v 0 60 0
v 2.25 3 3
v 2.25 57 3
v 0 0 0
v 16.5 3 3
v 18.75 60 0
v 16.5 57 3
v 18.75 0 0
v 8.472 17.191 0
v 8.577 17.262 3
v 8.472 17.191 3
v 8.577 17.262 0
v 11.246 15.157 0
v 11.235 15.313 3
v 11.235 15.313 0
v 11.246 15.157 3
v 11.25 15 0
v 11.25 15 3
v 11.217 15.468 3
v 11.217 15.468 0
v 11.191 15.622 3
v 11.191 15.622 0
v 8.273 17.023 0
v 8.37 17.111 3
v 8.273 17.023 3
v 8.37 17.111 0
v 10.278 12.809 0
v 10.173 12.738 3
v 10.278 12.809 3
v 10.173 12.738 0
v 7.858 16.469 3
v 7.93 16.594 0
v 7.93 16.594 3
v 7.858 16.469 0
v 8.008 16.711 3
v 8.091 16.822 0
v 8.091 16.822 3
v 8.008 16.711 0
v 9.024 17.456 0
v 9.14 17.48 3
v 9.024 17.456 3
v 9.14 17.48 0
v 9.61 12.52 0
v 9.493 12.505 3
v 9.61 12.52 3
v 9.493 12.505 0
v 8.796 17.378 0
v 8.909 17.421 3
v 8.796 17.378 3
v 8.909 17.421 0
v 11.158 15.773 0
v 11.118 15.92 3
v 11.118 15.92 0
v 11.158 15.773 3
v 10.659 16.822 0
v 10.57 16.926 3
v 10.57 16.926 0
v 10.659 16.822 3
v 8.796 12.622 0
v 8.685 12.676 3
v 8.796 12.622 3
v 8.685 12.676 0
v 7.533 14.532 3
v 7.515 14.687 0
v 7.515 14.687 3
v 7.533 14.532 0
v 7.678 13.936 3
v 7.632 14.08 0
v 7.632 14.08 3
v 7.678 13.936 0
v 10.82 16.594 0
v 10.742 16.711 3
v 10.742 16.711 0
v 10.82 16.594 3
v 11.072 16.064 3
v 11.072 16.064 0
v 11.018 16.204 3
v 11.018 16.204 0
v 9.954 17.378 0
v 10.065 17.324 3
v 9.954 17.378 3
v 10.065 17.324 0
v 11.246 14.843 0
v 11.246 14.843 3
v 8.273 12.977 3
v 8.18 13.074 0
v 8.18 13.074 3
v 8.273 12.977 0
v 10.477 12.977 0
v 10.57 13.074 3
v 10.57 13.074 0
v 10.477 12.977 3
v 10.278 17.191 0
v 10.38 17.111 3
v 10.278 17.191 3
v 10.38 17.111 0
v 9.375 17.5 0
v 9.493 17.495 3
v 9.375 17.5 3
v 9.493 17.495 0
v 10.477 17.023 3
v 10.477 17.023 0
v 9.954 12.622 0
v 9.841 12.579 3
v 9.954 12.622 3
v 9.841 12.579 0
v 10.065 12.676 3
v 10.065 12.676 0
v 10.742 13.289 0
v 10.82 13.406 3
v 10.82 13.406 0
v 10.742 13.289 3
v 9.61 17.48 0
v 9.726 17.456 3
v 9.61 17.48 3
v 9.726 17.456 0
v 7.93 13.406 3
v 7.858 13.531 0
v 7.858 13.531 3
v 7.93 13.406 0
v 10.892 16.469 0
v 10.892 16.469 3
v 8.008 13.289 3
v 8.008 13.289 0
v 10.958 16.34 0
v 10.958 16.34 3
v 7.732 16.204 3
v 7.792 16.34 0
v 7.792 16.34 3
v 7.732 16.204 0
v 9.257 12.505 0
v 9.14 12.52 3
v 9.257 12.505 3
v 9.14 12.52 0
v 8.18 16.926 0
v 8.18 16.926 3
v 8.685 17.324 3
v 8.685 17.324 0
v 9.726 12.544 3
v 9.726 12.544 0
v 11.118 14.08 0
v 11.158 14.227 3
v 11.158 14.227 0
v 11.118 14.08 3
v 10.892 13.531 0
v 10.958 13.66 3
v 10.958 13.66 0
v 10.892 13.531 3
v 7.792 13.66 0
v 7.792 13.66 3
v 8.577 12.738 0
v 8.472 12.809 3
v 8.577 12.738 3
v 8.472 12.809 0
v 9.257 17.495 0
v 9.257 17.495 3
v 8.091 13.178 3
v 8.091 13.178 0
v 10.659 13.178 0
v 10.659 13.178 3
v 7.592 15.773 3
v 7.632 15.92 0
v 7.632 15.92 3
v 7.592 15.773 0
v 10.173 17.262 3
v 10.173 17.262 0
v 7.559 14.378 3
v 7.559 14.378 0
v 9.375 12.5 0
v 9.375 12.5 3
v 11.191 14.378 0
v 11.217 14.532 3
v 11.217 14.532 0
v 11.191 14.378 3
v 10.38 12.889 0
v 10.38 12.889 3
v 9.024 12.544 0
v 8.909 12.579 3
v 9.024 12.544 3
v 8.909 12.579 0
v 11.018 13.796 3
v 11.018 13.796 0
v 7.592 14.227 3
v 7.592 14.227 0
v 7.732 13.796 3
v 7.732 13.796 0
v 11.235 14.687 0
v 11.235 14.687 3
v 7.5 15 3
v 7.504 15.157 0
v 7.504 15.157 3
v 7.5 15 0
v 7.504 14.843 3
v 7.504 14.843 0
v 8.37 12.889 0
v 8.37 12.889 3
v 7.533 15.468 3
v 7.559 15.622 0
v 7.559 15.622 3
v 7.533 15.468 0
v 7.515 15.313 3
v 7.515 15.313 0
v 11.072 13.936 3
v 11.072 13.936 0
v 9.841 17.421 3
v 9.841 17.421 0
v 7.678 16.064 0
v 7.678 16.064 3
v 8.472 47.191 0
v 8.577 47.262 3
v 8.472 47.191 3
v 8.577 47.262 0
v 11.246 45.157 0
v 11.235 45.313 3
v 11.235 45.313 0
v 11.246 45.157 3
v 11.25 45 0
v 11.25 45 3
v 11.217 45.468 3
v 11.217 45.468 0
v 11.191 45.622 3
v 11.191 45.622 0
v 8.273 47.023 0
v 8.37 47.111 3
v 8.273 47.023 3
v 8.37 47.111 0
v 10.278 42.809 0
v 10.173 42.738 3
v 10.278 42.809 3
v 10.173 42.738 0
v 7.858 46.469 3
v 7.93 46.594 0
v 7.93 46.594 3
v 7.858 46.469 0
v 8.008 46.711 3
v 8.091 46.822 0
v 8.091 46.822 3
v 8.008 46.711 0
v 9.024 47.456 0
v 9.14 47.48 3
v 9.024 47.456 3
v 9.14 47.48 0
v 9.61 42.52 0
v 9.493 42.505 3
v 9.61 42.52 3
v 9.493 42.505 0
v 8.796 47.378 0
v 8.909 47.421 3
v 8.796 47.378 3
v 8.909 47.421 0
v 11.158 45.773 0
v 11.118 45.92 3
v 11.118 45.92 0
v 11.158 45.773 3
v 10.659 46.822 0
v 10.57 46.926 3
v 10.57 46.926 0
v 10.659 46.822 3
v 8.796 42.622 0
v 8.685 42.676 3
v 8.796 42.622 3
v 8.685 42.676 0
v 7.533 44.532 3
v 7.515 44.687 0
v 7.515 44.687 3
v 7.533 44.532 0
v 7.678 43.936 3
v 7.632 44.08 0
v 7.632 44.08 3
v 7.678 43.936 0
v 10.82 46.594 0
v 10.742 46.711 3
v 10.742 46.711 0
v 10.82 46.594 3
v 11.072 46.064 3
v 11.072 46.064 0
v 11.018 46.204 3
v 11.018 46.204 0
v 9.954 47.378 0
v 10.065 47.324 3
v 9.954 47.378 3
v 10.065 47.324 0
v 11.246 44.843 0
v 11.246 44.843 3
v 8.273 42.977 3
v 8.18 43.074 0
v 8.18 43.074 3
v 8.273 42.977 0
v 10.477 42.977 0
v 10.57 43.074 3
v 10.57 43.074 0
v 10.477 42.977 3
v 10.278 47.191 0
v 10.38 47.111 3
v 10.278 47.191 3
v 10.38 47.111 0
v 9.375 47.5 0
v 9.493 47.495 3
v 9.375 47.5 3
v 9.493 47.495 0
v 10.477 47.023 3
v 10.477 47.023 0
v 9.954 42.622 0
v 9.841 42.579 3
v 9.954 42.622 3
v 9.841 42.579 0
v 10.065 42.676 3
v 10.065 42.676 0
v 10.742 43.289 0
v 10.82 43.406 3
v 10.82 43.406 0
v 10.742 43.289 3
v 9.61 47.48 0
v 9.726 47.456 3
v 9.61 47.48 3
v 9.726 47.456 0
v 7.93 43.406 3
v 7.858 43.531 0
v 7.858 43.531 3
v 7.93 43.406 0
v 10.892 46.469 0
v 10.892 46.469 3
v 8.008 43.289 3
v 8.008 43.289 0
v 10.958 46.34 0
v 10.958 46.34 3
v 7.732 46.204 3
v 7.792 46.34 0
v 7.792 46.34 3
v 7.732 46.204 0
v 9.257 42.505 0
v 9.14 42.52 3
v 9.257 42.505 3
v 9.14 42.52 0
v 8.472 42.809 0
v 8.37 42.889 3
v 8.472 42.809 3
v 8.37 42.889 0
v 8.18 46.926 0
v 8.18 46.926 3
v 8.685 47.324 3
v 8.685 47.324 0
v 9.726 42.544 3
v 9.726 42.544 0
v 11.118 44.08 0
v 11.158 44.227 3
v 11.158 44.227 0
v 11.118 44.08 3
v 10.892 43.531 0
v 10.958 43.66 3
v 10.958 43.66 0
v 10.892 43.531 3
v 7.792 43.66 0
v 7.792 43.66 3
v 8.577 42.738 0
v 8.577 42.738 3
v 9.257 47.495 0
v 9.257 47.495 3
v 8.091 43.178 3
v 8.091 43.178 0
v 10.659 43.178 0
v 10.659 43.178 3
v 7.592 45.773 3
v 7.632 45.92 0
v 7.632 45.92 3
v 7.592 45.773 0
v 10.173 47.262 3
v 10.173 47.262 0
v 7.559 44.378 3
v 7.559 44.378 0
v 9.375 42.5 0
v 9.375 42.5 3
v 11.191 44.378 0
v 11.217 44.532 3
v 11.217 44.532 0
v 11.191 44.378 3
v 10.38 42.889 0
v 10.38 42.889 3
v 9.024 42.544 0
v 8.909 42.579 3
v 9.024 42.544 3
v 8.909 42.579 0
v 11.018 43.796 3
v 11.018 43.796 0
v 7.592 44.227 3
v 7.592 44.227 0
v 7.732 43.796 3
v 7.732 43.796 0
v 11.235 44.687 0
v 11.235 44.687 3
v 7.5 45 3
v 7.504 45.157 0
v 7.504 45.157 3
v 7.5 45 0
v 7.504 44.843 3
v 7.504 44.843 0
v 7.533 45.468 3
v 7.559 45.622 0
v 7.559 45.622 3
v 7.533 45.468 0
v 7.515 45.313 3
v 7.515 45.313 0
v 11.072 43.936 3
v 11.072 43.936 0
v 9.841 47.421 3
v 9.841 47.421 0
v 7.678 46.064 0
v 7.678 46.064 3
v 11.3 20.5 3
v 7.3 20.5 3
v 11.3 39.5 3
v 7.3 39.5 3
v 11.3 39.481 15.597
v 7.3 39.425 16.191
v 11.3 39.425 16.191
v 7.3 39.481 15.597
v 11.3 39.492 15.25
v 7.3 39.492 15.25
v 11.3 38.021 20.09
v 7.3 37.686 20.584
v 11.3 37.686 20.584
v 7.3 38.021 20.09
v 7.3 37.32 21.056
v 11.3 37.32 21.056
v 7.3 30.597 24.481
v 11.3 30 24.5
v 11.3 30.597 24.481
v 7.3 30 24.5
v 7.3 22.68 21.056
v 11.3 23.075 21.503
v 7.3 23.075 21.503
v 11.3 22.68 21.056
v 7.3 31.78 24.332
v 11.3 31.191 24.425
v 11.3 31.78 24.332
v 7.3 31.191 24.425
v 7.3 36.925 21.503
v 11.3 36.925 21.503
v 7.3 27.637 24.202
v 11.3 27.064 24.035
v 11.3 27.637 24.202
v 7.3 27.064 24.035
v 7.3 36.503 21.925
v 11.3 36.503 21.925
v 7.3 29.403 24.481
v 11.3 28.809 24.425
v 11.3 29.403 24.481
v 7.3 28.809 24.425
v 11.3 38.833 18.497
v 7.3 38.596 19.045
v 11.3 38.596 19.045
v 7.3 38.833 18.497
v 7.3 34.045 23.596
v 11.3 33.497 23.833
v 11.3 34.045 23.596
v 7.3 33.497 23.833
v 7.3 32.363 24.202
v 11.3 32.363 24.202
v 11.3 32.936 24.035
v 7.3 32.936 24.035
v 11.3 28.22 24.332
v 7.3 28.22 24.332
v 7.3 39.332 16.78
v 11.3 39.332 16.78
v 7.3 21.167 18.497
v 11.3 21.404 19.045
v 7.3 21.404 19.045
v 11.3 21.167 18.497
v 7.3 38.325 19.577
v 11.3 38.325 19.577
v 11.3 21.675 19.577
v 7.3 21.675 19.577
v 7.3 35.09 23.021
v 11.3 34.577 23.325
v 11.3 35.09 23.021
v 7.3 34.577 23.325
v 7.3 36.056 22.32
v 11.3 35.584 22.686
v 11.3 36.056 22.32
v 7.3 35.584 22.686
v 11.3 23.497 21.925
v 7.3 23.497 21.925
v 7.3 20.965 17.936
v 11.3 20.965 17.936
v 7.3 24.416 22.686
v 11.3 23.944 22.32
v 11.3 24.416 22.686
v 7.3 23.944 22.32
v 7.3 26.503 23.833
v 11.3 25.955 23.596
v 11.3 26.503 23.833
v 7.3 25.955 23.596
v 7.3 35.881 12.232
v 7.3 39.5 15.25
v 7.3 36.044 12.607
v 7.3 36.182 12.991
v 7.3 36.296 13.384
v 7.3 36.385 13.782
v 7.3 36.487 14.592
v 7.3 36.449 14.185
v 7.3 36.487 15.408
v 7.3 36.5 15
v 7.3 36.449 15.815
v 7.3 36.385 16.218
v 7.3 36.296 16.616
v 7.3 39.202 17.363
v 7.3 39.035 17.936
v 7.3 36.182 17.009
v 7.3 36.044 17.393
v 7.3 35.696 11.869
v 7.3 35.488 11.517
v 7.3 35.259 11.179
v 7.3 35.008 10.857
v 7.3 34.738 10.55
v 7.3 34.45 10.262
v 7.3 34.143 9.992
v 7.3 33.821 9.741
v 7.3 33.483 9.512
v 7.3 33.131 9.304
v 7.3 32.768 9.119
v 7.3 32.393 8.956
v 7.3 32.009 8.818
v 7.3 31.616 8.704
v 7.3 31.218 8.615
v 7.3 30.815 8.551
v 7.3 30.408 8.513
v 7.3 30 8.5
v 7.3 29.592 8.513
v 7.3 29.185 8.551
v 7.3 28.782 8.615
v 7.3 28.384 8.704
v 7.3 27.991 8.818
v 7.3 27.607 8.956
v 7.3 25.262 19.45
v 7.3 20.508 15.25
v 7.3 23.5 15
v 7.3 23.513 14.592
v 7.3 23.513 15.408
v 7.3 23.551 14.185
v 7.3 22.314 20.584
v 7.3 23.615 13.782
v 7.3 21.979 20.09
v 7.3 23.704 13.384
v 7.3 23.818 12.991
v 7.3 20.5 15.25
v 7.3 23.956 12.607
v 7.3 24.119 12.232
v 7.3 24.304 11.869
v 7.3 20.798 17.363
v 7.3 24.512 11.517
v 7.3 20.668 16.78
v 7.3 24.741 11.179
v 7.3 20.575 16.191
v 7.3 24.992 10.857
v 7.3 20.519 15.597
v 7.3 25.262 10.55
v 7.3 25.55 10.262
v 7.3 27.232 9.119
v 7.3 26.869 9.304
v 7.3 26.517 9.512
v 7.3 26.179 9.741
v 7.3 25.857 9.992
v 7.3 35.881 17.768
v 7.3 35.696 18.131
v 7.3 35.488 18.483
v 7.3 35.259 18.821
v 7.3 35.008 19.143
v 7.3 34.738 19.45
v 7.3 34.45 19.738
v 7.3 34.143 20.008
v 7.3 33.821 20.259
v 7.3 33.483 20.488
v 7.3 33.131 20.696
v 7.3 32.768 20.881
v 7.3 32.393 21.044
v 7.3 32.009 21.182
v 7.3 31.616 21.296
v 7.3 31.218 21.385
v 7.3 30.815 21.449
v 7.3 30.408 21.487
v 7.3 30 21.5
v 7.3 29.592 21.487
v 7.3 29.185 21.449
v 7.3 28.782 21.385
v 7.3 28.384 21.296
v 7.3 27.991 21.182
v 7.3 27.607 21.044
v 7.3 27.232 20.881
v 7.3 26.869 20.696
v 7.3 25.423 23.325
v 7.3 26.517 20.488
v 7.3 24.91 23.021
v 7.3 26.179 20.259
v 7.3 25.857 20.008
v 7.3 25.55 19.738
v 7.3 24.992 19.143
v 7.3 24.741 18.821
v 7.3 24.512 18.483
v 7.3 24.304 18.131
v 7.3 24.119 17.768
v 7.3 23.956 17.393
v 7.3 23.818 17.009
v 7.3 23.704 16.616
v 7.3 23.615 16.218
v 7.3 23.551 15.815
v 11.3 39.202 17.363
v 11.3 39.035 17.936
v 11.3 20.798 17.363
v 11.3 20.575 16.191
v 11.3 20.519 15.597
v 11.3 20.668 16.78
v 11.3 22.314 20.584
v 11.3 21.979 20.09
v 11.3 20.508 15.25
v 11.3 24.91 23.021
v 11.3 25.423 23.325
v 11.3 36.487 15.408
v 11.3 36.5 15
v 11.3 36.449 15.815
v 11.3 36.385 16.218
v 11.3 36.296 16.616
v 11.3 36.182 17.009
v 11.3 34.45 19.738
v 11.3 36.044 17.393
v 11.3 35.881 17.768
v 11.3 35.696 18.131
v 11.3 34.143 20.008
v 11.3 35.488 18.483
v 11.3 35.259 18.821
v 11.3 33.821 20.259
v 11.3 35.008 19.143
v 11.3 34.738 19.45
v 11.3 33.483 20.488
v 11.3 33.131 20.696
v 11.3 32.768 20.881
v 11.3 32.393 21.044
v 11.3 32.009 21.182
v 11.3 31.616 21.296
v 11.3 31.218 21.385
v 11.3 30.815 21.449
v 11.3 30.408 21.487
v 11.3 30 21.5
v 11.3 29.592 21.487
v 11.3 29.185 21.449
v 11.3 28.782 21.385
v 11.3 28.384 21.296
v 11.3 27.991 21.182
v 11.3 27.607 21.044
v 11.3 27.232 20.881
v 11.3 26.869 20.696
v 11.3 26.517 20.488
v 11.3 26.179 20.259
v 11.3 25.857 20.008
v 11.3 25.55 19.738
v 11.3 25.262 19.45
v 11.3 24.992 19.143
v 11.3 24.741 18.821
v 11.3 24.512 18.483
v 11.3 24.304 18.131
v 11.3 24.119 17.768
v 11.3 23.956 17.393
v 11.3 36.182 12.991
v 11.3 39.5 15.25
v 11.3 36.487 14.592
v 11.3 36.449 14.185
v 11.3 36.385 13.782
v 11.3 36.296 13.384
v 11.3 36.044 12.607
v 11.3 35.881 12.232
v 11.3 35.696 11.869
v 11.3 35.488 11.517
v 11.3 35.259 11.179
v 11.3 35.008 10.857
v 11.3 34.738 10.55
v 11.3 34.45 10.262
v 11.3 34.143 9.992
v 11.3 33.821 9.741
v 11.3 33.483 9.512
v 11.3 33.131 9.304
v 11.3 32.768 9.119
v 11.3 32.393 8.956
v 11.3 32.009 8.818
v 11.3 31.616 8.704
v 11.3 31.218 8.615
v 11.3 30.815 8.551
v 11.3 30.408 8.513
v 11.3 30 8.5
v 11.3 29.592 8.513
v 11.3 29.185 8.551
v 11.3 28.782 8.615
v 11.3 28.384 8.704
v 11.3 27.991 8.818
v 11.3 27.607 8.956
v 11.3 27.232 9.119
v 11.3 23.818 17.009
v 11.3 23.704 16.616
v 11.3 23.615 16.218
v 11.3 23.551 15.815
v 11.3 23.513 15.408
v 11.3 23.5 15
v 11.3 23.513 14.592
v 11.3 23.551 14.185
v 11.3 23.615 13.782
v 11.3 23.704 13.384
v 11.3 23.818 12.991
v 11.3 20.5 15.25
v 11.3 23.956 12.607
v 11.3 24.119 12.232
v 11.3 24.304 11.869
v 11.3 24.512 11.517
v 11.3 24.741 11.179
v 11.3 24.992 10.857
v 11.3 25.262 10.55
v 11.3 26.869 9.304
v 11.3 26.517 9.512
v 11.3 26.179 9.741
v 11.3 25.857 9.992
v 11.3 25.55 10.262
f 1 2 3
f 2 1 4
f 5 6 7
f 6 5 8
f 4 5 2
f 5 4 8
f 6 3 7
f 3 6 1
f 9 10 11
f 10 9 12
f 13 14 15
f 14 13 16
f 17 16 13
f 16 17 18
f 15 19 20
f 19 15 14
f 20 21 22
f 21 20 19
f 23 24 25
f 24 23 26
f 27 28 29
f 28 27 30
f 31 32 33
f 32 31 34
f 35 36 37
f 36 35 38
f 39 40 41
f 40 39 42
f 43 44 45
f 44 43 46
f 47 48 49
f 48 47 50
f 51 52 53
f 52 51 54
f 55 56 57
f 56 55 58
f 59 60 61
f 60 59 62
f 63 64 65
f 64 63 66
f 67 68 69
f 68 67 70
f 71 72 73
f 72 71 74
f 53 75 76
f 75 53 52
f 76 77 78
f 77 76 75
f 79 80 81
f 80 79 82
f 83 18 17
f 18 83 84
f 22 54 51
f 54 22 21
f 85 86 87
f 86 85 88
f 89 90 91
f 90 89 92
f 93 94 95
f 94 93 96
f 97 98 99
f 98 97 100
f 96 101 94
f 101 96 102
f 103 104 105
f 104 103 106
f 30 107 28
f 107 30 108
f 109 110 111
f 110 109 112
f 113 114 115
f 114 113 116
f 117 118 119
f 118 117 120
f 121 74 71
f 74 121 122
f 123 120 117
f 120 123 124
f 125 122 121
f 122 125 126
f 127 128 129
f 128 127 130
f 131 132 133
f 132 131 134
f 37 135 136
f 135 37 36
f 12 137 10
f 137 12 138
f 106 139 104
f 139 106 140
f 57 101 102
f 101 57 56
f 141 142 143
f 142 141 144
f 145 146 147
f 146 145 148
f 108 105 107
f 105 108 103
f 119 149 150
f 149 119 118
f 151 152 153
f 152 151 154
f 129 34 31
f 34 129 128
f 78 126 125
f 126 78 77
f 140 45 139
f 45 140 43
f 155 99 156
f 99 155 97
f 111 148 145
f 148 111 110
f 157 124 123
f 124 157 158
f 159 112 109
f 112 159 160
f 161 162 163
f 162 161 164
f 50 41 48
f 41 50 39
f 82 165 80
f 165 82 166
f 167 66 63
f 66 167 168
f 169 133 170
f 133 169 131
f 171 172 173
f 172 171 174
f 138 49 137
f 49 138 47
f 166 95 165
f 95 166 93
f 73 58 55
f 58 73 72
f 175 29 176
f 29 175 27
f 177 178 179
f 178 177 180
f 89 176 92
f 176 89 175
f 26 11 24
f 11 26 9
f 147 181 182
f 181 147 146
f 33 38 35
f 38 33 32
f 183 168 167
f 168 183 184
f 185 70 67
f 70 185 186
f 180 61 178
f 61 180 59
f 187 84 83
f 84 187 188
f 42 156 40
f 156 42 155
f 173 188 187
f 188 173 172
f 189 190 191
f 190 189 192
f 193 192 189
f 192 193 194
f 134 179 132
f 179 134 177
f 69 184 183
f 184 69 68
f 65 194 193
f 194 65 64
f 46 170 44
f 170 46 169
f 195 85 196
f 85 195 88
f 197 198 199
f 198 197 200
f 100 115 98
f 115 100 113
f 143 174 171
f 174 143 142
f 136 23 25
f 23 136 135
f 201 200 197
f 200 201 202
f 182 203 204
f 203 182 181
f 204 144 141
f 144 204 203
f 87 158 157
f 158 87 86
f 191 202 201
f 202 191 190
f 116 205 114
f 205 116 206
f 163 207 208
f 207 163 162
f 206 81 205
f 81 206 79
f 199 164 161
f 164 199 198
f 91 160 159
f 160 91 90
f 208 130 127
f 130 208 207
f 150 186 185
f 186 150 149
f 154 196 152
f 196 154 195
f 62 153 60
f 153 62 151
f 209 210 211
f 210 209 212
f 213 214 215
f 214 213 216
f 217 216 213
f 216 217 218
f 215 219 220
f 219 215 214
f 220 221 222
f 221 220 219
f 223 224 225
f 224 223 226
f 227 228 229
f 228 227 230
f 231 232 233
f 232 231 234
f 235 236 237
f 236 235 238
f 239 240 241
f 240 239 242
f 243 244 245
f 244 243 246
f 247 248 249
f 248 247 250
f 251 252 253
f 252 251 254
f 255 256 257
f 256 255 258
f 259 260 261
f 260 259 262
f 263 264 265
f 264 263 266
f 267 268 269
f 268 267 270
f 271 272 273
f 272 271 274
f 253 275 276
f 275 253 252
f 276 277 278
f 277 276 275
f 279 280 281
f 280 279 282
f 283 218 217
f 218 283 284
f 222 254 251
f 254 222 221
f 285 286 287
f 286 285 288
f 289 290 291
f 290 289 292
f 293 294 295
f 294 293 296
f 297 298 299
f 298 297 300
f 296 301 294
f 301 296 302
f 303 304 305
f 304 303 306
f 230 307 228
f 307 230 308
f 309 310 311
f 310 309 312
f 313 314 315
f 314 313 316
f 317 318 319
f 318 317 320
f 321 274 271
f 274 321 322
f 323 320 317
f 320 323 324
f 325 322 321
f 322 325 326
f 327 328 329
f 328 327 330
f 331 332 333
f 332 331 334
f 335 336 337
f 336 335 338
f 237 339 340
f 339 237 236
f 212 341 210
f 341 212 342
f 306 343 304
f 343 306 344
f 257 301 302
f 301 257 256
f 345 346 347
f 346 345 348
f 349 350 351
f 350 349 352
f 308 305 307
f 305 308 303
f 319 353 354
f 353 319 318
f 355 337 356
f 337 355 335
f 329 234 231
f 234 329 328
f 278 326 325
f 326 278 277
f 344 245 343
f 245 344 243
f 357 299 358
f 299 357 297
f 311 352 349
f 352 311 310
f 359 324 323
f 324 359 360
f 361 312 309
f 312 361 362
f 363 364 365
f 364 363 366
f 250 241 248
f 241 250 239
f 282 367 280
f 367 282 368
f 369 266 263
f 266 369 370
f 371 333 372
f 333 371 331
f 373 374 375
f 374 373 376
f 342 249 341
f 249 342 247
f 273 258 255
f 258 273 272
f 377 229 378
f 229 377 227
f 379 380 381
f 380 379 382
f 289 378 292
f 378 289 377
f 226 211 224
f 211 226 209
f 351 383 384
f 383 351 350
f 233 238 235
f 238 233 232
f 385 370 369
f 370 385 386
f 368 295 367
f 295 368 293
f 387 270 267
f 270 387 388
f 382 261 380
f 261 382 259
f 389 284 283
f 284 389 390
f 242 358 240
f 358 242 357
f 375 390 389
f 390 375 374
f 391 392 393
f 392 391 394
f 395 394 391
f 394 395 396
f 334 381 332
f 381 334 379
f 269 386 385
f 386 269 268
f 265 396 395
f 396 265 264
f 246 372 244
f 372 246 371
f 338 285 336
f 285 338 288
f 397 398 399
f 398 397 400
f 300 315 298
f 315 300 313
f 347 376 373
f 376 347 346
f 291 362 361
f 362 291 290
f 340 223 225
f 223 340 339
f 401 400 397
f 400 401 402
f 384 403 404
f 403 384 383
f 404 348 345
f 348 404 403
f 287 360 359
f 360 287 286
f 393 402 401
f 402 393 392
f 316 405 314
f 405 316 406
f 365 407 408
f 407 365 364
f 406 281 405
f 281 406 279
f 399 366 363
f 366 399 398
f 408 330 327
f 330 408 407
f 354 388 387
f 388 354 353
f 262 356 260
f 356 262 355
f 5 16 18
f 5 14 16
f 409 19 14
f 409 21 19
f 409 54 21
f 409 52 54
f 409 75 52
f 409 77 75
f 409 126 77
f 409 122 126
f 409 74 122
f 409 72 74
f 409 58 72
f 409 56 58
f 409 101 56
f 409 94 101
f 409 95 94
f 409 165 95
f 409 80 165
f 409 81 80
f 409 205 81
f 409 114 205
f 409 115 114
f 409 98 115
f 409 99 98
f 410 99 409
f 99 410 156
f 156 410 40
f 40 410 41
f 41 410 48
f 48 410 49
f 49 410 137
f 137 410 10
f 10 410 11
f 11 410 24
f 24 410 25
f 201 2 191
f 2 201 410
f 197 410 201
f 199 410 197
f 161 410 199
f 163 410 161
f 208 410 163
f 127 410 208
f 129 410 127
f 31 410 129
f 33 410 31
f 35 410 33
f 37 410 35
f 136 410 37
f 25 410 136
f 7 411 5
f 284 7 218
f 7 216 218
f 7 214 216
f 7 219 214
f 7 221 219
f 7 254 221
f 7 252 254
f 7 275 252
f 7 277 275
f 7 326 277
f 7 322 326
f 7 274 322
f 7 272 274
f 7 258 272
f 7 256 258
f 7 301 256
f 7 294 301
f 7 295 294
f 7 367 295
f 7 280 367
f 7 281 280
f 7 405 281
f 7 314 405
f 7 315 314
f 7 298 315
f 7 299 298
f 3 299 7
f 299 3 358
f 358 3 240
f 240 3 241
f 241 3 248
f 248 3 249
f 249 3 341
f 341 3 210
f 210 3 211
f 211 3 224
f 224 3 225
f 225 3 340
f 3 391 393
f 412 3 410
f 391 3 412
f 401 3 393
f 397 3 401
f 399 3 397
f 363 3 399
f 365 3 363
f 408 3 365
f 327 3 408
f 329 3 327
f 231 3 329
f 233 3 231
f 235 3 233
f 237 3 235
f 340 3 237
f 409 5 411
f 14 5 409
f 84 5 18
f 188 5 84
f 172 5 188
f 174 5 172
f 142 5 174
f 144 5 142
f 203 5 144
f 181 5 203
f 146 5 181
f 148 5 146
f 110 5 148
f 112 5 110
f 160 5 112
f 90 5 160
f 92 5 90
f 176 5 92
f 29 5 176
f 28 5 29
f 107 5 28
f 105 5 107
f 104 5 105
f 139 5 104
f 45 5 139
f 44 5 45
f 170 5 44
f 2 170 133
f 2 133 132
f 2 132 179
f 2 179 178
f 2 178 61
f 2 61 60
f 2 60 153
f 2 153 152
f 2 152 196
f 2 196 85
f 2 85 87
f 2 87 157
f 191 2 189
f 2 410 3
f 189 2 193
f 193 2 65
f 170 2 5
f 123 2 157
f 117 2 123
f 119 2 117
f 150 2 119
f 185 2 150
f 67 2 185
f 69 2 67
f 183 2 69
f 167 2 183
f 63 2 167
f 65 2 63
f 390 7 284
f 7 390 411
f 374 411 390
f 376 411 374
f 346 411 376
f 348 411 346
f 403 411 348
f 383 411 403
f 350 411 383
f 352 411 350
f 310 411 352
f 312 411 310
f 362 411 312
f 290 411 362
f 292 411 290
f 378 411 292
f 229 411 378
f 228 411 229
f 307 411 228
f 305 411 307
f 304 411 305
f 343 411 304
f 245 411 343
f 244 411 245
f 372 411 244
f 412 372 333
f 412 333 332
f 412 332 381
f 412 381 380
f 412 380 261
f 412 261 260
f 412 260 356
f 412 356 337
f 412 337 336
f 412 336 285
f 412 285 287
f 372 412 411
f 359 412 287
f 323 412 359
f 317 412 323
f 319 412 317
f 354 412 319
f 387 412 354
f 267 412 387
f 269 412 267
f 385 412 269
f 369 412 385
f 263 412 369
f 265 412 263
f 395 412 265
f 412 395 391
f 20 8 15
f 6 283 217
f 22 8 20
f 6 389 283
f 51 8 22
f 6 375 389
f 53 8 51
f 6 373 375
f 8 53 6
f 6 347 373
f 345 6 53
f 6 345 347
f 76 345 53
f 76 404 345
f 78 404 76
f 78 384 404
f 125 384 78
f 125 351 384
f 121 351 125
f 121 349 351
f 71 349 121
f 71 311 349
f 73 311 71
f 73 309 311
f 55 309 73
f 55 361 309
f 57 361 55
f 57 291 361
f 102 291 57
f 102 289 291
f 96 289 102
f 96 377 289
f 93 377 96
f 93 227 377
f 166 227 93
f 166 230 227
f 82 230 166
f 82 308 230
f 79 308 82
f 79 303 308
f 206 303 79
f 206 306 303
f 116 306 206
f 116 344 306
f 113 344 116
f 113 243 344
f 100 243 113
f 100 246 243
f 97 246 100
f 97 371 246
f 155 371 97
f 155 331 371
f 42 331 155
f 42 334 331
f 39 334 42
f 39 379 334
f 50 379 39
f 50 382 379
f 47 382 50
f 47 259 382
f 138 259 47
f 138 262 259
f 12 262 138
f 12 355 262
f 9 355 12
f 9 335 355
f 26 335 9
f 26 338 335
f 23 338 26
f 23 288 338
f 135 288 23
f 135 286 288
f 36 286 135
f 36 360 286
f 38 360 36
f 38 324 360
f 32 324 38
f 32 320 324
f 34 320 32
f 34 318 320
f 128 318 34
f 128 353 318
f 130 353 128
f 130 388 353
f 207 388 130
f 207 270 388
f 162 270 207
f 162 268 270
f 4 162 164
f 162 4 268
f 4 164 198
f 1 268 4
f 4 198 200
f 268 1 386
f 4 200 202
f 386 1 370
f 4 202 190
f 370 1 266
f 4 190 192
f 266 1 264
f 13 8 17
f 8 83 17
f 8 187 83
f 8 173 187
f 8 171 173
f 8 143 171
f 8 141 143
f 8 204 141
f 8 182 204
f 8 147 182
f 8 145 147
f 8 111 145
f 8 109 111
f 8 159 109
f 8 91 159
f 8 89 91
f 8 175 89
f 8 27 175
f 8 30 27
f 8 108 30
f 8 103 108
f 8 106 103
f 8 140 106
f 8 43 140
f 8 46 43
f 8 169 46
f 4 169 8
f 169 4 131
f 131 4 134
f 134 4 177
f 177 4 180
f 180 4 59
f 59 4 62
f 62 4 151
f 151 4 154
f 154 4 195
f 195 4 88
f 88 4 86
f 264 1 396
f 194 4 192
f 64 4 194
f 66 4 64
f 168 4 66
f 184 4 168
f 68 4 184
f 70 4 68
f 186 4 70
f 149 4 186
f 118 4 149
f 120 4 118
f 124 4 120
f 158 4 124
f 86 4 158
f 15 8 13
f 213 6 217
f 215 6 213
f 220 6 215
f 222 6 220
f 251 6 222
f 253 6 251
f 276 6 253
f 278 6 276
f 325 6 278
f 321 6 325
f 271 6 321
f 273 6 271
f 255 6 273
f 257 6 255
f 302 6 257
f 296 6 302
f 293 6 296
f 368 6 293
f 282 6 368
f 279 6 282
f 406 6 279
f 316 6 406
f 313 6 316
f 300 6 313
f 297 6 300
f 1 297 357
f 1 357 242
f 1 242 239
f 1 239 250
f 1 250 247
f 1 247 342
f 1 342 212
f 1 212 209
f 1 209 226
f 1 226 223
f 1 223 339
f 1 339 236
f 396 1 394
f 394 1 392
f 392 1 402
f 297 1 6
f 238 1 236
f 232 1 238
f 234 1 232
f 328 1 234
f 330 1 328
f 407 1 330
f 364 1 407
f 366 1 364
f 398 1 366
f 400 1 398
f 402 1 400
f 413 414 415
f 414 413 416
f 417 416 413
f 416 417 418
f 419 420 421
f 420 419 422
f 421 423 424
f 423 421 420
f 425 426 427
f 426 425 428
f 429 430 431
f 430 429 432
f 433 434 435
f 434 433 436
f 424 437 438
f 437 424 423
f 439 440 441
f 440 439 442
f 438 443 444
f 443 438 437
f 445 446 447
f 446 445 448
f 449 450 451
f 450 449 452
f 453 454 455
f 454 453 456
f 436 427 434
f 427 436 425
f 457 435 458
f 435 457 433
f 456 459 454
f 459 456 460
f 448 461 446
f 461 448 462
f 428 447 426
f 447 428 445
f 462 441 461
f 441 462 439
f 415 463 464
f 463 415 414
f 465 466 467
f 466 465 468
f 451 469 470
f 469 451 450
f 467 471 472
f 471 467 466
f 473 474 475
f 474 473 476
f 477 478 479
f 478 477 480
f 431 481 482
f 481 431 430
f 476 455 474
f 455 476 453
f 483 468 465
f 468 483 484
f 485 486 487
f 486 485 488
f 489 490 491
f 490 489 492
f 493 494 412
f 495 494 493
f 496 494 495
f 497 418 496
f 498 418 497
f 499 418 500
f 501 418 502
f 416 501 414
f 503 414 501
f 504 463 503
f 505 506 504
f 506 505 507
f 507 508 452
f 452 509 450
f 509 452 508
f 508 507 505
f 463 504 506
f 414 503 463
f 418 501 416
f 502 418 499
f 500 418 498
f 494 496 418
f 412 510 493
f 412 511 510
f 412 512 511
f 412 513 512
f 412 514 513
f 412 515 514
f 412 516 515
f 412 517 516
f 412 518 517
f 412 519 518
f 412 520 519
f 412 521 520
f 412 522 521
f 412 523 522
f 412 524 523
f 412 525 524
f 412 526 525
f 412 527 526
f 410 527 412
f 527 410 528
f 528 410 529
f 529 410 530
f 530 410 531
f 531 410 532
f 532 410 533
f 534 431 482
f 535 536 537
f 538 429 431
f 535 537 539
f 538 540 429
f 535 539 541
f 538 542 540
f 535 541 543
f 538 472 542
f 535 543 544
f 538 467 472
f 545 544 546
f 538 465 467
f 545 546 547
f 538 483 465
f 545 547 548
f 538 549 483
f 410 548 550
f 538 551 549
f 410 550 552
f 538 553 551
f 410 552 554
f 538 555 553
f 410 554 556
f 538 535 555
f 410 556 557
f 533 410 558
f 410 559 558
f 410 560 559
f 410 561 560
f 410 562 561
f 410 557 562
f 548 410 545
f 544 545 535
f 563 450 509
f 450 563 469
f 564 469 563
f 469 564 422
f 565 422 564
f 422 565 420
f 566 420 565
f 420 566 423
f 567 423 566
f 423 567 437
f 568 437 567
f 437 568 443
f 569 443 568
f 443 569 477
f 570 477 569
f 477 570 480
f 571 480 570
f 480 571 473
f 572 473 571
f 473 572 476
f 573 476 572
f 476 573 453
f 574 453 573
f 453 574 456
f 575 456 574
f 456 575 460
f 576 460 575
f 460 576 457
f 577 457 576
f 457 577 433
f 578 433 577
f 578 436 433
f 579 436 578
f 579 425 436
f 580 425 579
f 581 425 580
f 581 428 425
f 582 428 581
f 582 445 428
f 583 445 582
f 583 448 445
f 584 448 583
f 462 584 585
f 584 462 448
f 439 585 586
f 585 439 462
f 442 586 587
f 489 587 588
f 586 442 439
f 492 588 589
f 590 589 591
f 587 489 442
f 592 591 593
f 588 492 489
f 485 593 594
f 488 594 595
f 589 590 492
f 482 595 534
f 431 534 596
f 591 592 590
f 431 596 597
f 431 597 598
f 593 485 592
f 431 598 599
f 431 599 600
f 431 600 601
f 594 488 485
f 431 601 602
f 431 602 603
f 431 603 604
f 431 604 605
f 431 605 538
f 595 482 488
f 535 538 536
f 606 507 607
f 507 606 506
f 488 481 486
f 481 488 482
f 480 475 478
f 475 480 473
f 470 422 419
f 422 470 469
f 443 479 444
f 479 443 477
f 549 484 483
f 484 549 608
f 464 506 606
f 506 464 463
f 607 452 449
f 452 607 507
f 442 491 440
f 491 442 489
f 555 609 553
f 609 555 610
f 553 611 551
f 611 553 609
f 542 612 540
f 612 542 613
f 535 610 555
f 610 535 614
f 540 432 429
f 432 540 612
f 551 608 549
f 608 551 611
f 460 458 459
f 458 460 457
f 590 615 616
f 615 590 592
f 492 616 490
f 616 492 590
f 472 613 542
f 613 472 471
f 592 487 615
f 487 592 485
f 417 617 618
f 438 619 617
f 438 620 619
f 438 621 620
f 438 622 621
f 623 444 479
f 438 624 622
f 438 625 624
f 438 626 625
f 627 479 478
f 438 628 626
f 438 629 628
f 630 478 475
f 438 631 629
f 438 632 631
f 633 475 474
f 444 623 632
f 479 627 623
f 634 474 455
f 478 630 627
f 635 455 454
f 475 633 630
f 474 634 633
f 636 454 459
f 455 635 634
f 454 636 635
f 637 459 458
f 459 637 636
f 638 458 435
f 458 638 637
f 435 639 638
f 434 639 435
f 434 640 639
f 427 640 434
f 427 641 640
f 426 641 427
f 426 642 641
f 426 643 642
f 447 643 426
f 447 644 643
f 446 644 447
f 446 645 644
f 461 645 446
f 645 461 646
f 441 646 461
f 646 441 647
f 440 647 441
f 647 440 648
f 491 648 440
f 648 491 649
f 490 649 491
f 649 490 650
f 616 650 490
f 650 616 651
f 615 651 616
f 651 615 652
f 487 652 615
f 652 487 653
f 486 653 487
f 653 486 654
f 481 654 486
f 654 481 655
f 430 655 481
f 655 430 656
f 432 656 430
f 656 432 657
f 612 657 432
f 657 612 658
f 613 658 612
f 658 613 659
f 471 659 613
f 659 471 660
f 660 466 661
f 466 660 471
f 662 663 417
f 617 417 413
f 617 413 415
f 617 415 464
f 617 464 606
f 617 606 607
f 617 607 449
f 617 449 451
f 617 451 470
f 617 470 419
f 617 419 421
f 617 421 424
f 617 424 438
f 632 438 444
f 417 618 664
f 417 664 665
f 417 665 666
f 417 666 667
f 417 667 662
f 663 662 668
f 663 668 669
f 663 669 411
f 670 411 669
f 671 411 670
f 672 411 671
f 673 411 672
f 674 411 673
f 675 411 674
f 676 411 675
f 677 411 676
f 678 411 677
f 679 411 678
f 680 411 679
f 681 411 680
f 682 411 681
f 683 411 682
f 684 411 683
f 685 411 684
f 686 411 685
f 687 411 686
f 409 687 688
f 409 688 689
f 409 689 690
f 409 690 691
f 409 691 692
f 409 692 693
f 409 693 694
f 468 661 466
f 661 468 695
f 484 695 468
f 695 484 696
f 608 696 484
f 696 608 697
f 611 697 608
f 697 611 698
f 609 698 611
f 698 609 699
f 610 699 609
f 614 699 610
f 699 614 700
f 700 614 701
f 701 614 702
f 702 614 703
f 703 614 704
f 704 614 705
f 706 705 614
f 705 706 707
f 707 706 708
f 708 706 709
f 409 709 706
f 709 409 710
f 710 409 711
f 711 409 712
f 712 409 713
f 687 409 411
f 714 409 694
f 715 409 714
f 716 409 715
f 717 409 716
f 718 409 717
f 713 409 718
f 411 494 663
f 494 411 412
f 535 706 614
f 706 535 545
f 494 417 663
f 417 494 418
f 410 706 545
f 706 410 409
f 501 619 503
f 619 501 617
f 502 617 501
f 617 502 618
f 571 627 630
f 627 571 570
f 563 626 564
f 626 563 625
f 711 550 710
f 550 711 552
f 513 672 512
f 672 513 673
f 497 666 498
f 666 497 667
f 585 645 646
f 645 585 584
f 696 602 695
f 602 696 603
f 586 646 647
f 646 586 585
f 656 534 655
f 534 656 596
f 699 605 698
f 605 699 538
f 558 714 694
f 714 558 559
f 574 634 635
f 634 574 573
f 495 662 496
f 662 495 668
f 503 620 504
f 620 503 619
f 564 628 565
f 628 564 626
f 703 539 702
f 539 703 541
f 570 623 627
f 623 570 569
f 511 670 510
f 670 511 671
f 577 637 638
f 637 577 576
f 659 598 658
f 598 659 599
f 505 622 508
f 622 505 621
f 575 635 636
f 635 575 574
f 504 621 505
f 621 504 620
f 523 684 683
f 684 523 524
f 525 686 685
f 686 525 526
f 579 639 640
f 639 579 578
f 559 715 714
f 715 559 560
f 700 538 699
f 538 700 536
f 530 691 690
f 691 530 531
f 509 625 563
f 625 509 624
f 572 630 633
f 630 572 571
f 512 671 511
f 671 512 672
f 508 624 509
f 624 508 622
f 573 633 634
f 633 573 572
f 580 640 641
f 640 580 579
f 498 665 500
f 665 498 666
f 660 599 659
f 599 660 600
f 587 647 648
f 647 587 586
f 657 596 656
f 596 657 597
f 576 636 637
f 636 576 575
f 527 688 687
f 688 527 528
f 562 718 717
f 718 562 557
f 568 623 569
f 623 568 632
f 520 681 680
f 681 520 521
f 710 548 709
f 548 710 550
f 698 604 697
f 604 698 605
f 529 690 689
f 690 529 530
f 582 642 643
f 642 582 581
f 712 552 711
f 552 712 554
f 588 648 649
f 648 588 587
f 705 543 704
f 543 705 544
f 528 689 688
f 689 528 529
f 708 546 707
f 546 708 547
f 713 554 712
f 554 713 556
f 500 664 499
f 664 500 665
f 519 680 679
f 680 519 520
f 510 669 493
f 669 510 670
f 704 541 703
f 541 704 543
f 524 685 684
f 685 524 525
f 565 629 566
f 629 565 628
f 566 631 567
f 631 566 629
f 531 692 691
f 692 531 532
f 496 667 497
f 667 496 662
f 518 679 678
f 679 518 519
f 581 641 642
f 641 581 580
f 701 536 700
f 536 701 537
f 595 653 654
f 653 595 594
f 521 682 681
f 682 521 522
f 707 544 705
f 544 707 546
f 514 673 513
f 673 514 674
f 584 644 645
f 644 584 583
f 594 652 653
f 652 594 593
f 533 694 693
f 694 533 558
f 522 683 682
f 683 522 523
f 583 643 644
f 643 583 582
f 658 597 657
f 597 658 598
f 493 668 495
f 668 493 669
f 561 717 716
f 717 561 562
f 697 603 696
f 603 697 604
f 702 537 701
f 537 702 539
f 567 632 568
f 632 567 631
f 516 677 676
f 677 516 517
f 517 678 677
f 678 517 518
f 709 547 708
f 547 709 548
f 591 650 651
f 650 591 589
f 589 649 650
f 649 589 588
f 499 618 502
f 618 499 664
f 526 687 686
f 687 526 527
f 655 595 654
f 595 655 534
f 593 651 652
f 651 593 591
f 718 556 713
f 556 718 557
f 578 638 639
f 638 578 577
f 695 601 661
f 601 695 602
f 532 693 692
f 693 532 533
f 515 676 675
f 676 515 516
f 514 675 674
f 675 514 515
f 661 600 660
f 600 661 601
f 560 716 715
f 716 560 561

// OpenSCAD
//Timbers Antenna holder

antennaDiam = 13;
screwDiam = 5;
height = 60;
width = 25;
thickness = 3;

module backplate(){
    difference(){
        union(){
            cube([width, height, thickness]);
        }
    
        union(){
            translate([0, 0, 0])
            rotate([0, -45, 0])
            cube([thickness * 2, height, thickness * 2]);
            translate([width, 0, 0])
            rotate([0, -45, 0])
            cube([thickness * 2, height, thickness * 2]);
            
            translate([0, 0, 0])
            rotate([45, 0, 0])
            cube([width, thickness*2, thickness * 2]);
            translate([0, height, 0])
            rotate([45, 0, 0])
            cube([width, thickness*2, thickness * 2]);
            
            translate([width/2, height/4])
            cylinder(10, screwDiam/2, screwDiam/2, $fn = 100, true);
            translate([width/2, 3*height/4])
            cylinder(10, screwDiam/2, screwDiam/2, $fn = 100, true);
        }
    }
}

module antennaMount(){
    difference(){
        union(){
            translate([width/2, height/2, 15])
            rotate([90, 0, 0])
            cylinder(thickness+1, antennaDiam/2 + 3, antennaDiam/2 + 3, $fn = 100, true);
            
            translate([width/2, height/2, 9])
            cube([antennaDiam + 6, thickness + 1, antennaDiam + 6 - antennaDiam/2], true);
        }
        
        union(){
            translate([width/2, height/2, 15])
            rotate([90, 0, 0])
            cylinder(thickness + 5, antennaDiam/2, antennaDiam/2, $fn = 100, true);
        }
    }
}








module main(){
    
    scale([0.75, 1, 1])
    backplate();
    translate([39.3, 17.5, 0])
    rotate([0, 0, 90])
    antennaMount();
    
}main();
